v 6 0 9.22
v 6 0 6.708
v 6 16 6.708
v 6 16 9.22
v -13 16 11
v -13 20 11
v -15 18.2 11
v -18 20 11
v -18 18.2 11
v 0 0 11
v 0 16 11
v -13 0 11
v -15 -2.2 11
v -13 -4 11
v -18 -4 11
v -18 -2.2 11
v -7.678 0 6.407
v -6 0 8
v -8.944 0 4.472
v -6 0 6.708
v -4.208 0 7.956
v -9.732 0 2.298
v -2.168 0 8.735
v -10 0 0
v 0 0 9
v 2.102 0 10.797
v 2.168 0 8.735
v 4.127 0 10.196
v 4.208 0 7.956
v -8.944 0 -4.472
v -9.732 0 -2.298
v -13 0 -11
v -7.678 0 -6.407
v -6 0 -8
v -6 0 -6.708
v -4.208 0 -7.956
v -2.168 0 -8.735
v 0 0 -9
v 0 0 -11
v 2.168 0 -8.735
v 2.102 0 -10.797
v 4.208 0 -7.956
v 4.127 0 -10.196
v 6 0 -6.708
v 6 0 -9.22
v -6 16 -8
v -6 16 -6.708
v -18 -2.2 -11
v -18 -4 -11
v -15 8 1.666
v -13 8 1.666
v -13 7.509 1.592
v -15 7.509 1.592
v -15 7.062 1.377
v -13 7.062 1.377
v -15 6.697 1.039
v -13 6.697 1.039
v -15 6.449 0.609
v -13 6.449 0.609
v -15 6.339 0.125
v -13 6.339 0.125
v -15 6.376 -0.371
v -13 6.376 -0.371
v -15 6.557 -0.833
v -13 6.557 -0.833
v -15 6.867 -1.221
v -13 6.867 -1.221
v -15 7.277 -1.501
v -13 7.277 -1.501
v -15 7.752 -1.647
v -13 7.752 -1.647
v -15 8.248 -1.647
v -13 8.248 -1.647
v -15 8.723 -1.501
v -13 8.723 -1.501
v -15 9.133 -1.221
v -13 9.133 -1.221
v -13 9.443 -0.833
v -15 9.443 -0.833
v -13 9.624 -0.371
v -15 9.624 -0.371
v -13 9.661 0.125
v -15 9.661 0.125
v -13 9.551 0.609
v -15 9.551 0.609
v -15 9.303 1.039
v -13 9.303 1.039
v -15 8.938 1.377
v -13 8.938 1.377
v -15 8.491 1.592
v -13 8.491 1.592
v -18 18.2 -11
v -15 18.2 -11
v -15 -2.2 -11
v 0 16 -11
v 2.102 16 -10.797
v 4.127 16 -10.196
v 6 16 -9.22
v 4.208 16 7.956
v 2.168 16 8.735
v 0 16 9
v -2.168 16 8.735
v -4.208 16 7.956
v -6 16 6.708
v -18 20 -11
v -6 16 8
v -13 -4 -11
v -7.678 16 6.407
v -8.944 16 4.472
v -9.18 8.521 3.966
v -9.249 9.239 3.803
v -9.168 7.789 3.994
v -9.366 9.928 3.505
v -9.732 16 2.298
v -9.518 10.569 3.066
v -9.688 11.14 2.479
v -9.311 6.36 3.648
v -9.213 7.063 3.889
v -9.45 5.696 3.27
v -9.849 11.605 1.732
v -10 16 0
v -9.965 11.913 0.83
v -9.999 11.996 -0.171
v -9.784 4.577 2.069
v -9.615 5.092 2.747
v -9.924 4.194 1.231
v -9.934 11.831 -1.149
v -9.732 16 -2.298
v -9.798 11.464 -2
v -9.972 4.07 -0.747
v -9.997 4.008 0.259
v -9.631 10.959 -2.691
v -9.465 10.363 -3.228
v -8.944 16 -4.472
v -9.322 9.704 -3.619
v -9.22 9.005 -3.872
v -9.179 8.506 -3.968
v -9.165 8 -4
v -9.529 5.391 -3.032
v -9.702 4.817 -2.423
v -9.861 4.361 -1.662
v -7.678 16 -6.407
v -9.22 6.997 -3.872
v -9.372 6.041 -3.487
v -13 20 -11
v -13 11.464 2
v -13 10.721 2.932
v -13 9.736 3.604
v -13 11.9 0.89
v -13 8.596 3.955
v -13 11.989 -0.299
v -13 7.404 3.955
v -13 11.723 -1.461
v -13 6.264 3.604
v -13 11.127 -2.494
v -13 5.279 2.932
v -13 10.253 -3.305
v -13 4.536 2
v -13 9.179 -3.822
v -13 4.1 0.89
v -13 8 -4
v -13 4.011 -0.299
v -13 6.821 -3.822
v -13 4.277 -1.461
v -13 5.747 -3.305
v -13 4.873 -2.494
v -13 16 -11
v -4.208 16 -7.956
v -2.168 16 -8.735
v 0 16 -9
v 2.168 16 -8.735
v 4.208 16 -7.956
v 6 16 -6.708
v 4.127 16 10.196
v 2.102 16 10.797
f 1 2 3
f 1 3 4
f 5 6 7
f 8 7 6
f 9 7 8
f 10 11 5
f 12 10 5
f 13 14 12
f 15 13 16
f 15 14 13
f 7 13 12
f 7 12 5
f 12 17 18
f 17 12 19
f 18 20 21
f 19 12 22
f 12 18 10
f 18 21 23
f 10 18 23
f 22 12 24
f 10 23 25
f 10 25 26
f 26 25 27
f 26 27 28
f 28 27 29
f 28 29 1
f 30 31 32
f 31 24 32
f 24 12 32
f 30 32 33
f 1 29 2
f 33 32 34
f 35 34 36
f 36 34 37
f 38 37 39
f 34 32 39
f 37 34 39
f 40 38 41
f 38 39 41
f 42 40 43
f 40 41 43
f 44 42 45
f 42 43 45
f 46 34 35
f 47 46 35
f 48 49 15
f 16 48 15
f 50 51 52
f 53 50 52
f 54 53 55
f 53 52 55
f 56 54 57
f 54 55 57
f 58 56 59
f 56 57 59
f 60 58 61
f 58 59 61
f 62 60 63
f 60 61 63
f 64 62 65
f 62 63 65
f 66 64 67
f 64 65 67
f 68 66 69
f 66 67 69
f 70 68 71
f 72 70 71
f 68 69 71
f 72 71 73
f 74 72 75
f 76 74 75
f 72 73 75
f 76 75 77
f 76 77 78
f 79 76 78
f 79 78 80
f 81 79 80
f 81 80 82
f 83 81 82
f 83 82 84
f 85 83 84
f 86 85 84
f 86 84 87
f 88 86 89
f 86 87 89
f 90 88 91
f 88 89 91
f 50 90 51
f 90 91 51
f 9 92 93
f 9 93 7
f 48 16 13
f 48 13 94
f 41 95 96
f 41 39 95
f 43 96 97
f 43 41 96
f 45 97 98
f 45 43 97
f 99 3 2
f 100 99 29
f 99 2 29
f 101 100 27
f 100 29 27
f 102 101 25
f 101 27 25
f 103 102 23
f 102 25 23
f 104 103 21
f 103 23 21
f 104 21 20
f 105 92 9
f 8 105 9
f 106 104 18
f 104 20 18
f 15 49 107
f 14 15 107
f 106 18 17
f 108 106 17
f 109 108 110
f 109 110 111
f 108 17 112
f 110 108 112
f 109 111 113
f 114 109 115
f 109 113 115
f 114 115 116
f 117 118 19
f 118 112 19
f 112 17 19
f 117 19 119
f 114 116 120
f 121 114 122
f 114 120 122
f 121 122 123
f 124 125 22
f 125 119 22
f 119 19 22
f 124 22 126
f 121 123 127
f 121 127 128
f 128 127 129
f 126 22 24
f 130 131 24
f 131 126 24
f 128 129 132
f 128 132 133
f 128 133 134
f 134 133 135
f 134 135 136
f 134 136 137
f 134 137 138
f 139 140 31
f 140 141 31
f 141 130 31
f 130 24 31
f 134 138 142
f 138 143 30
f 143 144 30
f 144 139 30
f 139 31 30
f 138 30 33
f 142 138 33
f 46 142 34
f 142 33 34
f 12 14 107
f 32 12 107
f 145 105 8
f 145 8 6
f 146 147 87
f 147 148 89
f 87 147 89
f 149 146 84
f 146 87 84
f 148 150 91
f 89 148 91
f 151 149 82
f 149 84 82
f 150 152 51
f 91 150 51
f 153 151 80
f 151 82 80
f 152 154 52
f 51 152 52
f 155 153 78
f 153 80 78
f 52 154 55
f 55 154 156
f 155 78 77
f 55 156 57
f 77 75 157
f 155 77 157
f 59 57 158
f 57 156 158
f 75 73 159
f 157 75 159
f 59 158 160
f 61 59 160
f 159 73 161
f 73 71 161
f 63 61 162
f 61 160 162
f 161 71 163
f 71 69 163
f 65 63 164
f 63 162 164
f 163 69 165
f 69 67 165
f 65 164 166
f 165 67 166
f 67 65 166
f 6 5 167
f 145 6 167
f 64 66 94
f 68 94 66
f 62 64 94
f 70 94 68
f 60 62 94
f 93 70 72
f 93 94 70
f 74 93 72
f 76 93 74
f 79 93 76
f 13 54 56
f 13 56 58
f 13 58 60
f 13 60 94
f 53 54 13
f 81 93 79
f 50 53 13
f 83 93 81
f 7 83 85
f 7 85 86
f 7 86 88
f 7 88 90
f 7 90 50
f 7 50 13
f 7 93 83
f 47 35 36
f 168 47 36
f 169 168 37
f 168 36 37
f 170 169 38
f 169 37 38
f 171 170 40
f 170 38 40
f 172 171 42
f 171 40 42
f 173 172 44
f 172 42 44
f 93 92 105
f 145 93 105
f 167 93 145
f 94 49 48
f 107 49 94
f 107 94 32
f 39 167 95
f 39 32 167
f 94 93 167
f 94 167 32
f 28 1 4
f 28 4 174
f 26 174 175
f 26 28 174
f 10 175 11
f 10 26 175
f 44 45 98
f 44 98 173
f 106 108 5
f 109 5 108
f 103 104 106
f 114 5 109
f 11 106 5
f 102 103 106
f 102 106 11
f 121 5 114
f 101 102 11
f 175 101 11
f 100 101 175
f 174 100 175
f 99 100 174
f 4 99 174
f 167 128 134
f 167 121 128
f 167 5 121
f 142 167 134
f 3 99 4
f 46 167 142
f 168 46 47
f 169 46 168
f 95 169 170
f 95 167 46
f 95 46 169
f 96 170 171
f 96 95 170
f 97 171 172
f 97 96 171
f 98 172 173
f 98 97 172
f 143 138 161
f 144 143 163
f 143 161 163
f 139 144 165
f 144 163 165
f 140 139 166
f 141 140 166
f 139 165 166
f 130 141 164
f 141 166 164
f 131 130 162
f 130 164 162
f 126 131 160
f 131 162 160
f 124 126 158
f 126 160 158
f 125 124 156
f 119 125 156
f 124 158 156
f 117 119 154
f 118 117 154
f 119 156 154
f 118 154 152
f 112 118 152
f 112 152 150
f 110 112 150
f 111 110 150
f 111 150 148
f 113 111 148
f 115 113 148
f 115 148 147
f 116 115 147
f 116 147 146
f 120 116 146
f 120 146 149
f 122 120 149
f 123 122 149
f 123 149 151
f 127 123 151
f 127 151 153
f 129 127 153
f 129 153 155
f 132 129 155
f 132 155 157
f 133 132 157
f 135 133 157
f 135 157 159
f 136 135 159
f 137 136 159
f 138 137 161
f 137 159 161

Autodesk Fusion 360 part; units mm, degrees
cylinder "CylinderPrimitive1" add diameter 18.5 height 80 placed x (1, 0, 0) y (0, 0, -1) z (0, 1, 0) at (0, 0, 0) makes body 1
sketch "Sketch2" plane through (0, 0, 0) normal (0, 1, 0) x (1, 0, 0)
  circle A0 centre (0, 0) radius 9
  line L0 (-23.395, 11) -> (16.2834, 11)
  line L1 (16.2834, 11) -> (16.2834, -11)
  line L2 (16.2834, -11) -> (-23.395, -11)
  line L3 (-23.395, -11) -> (-23.395, 11)
  circle A1 centre (0, 0) radius 10
  line L4 (0, 17.0641) -> (0, -18.6824) construction
  line L5 (-36.3056, 0) -> (26.2246, 0) construction
  line L6 (0, 9) -> (13.2349, 9)
  line L7 (13.2349, 9) -> (13.2349, -9)
  line L8 (13.2349, -9) -> (0, -9)
  line L9 (0, -9) -> (0, 9)
  line L10 (6, 8) -> (6, -8)
  circle A2 centre (0, 0) radius 11
  line L11 (6, 8) -> (6, 11)
  line L12 (6, -8) -> (6, -11)
  line L13 (-13, 11) -> (-18, 11)
  line L14 (-18, 11) -> (-18, -11)
  line L15 (-18, -11) -> (-13, -11)
  line L16 (-13, -11) -> (-13, 11)
  line L17 (-6, 8) -> (-6, -8)
  line L18 (-6, -8) -> (-6, -11)
  line L19 (-6, 8) -> (-6, 11)
  dimension "d3" = 18
  dimension "d4" = 11
  dimension "d5" = 11
  dimension "d6" = 1
  dimension "d7" = 6
  dimension "d8" = 2
  dimension "d9" = 5
  dimension "d10" = 13
extrude "Extrude1" add sketch "Sketch2" along normal blind 16 separate body contours A0 A1 L6 L10 | A0 A1 L8 L10 | A0 A1 L6 L17 | A1 L6 L11 | A0 A1 L8 L17 | A1 L8 L12 | A1 L6 A2 L11 L19 | A1 L8 A2 L12 L18 | A1 A2 L18 L19 | L0 A2 L19 | L0 L2 A2 L16 L18 L19 | L2 A2 L18 | L0 L2 L13 L14 L15 L16 makes body 2
sketch "Sketch3" plane through (-18, 0, 0) normal (-1, 0, 0) x (0, 0, 1)
  line L0 (-11, 0) -> (11, 0)
  line L1 (11, 0) -> (11, 16)
  line L2 (11, 16) -> (-11, 16)
  line L3 (-11, 16) -> (-11, 0)
  line L4 (11, 16) -> (-11, 0)
  line L5 (-11, 16) -> (11, 0)
  line L6 (-14, 18.2) -> (14, 18.2)
  line L7 (14, 18.2) -> (14, -2.2)
  line L8 (14, -2.2) -> (-14, -2.2)
  line L9 (-14, -2.2) -> (-14, 18.2)
  point P0 (0, 8)
  dimension "d21" = 10.2
  dimension "d22" = 10.2
  dimension "d23" = 14
  dimension "d24" = 14
hole "Hole1" at (-18, 8, 0) direction (1, 0, 0) diameter 3.332 end through all bodies 1 2
extrude "Extrude2" add sketch "Sketch2" along normal blind 20 and the other way blind 4 contours L0 L2 L13 L14 L15 L16 bodies 2
extrude "Extrude3" cut sketch "Sketch3" against normal blind 3 contours L0 L4 L5 | L3 L4 L5 | L1 L4 L5 | L2 L4 L5 | L6 L7 L8 L9 bodies 2
hole "Hole2" at (-18, 8, 0) direction (1, 0, 0) diameter 3.332 end through all bodies 1 2
ref_plane "WorkPlane1" through (-9, 0, 0) normal (1, 0, 0) x (0, 1, 0)
sketch "Sketch4" plane through (-9, 0, 0) normal (1, 0, 0) x (0, 0, -1)
  point P0 (0, 8)
hole "Hole3" at (-9, 8, 0) direction (-1, 0, 0) diameter 8 depth 4 tip angle 180 bodies 2
hidden bodies 1
